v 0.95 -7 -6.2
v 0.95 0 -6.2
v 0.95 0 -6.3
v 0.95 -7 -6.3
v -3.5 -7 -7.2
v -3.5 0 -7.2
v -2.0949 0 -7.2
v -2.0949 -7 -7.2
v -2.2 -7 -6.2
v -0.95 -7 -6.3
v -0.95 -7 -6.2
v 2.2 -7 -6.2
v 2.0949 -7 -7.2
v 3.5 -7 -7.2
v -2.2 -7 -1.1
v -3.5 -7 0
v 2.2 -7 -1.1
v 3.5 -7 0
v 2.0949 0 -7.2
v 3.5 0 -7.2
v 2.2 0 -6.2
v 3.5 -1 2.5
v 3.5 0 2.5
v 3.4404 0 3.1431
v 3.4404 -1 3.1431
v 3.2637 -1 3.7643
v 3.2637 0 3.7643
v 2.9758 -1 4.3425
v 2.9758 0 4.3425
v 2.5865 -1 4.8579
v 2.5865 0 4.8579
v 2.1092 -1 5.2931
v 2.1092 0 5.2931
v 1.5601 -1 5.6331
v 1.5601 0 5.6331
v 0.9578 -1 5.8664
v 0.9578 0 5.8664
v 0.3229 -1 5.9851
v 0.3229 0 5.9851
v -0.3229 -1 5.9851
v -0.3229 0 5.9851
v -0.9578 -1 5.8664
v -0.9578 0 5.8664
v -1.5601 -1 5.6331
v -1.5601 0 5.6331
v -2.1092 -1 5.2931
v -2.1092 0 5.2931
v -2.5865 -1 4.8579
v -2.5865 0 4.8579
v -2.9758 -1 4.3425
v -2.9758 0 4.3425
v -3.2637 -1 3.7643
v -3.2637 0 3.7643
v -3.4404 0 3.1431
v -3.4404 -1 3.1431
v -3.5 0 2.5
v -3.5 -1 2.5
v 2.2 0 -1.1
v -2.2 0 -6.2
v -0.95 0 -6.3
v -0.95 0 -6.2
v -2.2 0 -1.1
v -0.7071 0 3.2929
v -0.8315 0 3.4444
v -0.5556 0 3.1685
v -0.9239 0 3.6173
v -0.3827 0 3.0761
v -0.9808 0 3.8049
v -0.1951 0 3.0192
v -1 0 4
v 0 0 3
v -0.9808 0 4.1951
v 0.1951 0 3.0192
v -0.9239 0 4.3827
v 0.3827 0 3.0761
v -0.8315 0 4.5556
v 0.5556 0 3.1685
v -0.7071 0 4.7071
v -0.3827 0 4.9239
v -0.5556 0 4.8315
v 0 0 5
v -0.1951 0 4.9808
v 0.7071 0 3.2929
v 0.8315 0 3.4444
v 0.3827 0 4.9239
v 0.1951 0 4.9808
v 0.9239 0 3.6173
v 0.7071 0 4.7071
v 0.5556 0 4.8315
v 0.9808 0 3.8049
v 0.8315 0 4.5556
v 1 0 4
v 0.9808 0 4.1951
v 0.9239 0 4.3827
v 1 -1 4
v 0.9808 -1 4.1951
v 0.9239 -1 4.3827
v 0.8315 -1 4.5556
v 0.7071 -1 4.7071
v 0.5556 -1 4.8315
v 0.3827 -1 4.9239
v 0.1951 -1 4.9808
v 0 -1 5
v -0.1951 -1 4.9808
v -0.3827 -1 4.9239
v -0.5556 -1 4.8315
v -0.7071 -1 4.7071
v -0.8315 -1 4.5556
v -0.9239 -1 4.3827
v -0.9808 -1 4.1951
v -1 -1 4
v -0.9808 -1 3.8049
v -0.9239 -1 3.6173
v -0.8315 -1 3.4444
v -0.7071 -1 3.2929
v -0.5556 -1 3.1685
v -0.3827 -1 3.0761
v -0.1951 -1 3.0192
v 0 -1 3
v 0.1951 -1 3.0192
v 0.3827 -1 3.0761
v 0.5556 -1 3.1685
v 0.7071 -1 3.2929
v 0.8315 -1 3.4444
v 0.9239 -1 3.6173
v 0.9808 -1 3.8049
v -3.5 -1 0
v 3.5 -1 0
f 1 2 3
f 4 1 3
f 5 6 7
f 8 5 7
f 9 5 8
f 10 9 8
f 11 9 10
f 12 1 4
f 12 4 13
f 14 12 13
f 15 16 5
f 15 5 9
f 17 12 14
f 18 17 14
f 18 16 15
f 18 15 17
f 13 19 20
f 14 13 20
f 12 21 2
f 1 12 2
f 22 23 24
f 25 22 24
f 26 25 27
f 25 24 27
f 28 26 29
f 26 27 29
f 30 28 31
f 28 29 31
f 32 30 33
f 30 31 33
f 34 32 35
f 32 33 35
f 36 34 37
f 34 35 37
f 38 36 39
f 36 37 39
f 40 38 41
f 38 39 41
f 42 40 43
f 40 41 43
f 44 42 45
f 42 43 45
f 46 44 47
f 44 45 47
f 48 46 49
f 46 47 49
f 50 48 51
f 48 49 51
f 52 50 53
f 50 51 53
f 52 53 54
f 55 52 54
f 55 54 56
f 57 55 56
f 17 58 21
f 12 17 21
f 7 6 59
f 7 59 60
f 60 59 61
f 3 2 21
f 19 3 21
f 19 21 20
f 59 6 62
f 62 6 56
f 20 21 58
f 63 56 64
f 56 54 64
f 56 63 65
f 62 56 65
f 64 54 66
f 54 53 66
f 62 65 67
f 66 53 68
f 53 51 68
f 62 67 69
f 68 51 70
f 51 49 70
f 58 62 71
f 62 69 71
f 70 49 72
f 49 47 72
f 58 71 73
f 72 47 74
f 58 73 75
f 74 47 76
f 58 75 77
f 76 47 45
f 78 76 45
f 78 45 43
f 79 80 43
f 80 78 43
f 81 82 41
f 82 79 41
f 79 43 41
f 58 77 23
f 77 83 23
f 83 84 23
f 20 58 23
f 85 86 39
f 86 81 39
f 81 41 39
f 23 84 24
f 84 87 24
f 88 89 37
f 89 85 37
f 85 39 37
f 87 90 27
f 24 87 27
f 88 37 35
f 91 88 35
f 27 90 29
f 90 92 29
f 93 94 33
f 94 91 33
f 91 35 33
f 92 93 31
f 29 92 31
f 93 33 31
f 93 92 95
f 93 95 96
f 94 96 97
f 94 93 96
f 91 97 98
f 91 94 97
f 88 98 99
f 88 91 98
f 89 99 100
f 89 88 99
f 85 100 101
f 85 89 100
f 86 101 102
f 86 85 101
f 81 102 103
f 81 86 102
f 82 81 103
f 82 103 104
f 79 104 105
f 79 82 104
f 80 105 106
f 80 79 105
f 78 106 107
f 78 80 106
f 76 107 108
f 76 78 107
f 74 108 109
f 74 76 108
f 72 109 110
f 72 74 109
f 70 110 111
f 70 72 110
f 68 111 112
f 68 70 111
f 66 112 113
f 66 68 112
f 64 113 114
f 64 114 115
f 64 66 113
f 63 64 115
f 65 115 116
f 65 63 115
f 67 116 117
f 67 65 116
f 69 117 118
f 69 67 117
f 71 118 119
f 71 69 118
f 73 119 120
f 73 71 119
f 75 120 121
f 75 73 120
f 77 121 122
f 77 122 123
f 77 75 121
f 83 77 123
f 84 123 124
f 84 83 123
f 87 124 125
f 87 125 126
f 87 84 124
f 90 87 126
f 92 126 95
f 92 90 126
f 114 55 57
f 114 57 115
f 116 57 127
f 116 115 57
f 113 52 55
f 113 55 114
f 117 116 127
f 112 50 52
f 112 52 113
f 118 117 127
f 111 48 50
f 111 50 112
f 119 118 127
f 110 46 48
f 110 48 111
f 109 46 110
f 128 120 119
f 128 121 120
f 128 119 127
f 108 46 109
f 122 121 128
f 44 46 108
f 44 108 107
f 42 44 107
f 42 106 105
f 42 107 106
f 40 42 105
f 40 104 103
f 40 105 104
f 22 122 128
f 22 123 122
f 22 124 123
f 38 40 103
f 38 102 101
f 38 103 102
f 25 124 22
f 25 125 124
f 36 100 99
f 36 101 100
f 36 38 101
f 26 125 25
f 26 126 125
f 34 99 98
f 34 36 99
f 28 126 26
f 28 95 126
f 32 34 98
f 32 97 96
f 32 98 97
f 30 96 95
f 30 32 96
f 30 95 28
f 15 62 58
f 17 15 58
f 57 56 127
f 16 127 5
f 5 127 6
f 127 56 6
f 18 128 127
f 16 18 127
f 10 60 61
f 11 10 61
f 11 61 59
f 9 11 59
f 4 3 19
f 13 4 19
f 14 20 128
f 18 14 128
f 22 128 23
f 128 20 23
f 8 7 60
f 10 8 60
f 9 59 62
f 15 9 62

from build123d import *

# Parameters (mm, degrees)
F1_DEPTH = 7
F0_R     = 1
F2_DEPTH = 1


with BuildPart() as f1:
    # F0 (on Front) → F1 (new body)
    with BuildSketch(Plane.XZ):
        Polygon((-0.95, -6.2), (-2.2, -6.2), (-2.2, -1.1), (2.2, -1.1), (2.2, -6.2), (0.95, -6.2), (0.95, -6.3), (2.094895, -7.2), (3.5, -7.2), (3.5, 0), (-3.5, 0), (-3.5, -7.2), (-2.094895, -7.2), (-0.95, -6.3), align=None)
    extrude(amount=F1_DEPTH)

    # F0 (on Front) → F2 (join)
    with BuildSketch(Plane.XZ):
        with BuildLine():
            Line((-3.5, 2.5), (-3.5, 0))
            Line((-3.5, 0), (3.5, 0))
            Line((3.5, 0), (3.5, 2.5))
            ThreePointArc((3.5, 2.5), (0, 6), (-3.5, 2.5))
        make_face()
        with Locations((0, 4)):
            Circle(F0_R, mode=Mode.SUBTRACT)
    extrude(amount=F2_DEPTH)


solid = f1.part
